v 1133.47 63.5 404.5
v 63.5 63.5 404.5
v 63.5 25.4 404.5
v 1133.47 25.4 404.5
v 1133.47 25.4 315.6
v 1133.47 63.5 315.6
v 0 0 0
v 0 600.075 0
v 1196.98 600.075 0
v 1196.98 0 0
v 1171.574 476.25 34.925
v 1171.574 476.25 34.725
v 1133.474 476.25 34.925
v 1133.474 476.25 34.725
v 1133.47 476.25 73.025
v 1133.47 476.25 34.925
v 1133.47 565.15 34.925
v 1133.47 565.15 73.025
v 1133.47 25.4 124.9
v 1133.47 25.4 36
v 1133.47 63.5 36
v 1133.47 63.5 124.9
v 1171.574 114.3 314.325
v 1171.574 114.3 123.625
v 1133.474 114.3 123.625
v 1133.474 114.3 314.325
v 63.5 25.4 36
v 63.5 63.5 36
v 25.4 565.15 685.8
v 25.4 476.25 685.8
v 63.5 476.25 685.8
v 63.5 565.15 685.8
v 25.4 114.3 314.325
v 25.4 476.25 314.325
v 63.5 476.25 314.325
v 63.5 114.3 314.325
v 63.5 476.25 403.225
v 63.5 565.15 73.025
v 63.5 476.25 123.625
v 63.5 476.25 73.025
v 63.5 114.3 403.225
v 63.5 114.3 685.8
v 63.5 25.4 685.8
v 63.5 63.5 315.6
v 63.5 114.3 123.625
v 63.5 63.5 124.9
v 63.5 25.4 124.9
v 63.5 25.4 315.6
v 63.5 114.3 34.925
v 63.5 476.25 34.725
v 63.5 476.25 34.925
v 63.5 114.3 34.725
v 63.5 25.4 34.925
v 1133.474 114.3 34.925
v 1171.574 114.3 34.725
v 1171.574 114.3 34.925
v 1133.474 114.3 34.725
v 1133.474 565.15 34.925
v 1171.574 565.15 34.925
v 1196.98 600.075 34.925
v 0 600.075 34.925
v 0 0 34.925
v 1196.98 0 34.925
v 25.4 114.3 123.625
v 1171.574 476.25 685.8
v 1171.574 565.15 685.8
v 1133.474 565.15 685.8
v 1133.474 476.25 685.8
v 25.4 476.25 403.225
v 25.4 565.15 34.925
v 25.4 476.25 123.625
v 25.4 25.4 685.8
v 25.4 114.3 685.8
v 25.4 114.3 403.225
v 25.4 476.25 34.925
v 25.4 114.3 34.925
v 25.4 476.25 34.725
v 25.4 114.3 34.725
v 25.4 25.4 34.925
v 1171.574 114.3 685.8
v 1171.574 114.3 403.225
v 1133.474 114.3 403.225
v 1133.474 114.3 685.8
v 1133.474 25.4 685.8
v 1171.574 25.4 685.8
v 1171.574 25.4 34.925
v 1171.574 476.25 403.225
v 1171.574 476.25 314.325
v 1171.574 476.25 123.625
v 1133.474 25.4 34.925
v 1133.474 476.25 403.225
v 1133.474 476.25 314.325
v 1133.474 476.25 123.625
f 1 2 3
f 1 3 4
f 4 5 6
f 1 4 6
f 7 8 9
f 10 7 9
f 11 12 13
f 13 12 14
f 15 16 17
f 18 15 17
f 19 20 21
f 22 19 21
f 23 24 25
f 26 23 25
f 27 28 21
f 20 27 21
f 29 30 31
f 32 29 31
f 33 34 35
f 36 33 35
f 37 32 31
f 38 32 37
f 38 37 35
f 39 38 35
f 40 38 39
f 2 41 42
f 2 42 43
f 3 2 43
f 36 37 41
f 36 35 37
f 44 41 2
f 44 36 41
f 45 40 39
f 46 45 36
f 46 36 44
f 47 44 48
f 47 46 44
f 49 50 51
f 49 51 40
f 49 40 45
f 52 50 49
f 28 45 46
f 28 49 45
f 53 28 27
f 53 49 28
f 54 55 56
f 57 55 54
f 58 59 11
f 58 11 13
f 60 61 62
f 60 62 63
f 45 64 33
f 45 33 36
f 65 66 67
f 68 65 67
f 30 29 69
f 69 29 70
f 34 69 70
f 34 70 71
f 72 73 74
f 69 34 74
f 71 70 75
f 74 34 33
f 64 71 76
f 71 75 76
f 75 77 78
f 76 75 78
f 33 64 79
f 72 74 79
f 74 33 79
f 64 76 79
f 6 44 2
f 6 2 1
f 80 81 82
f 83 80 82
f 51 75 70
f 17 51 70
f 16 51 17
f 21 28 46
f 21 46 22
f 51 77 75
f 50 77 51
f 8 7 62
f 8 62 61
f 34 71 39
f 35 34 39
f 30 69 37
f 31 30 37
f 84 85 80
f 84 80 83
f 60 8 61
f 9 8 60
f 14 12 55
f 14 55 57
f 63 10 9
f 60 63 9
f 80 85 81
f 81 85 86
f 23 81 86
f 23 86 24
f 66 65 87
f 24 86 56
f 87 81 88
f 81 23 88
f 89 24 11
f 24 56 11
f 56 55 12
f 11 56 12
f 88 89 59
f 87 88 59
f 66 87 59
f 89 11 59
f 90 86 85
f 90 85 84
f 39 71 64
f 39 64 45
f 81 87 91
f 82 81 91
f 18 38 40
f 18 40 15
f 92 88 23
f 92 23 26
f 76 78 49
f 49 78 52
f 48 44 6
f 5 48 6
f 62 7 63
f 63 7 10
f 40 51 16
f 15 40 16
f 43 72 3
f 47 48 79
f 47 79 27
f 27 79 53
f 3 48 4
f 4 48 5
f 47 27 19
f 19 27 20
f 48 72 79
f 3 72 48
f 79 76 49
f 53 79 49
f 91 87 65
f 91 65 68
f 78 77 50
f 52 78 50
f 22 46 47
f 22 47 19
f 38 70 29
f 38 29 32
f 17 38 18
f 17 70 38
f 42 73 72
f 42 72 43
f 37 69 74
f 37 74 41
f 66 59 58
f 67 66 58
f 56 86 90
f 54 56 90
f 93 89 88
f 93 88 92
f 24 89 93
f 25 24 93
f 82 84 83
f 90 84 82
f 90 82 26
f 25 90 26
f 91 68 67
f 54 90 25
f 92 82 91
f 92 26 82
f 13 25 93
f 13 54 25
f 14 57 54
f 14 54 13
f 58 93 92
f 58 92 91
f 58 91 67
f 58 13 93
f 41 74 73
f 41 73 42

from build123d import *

# Parameters (mm, degrees)
BOX_W        = 1196.98
BOX_H        = 600.075
BOX_DEPTH    = 34.925
BOX001_W     = 38.1
BOX001_H     = 88.9
BOX001_DEPTH = 650.875
BOX002_W     = 1069.97
BOX002_H     = 38.1
BOX002_DEPTH = 88.9
BOX003_W     = 38.1
BOX003_H     = 361.95
BOX003_DEPTH = 88.9
BOX004_W     = 1069.97
BOX004_H     = 38.1
BOX004_DEPTH = 88.9
BOX005_W     = 38.1
BOX005_H     = 361.95
BOX005_DEPTH = 88.9
BOX006_W     = 1069.97
BOX006_H     = 88.9
BOX006_DEPTH = 38.1


with BuildPart() as tabletop:
    # Box → Box (new body)
    with BuildSketch(Plane.XY):
        with Locations((598.49, 300.0375)):
            Rectangle(BOX_W, BOX_H)
    extrude(amount=BOX_DEPTH)


with BuildPart() as leg_br:
    # Box001 → Box001 (new body)
    with BuildSketch(Plane(origin=(25.4, 25.4, 34.925), x_dir=(1, 0, 0), z_dir=(0, 0, 1))):
        with Locations((19.05, 44.45)):
            Rectangle(BOX001_W, BOX001_H)
    extrude(amount=BOX001_DEPTH)


with BuildPart() as part_mirroring001:
    # Part__Mirroring001: instance of leg_br
    add(leg_br.part.mirror(Plane(origin=(598.487, 0, 0), x_dir=(0, -1, 0), z_dir=(1, 0, 0))))


with BuildPart() as back_support:
    # Box002 → Box002 (new body)
    with BuildSketch(Plane(origin=(63.5, 25.4, 214), x_dir=(1, 0, 0), z_dir=(0, 0, 1))):
        with Locations((534.985, 19.05)):
            Rectangle(BOX002_W, BOX002_H)
    extrude(amount=BOX002_DEPTH)


with BuildPart() as side_support:
    # Box003 → Box003 (new body)
    with BuildSketch(Plane(origin=(25.4, 114.3, 212.725), x_dir=(1, 0, 0), z_dir=(0, 0, 1))):
        with Locations((19.05, 180.975)):
            Rectangle(BOX003_W, BOX003_H)
    extrude(amount=BOX003_DEPTH)


with BuildPart() as braces_lower:
    # Part__Mirroring003: instance of side_support
    add(side_support.part.mirror(Plane(origin=(598.487, 0, 0), x_dir=(0, -1, 0), z_dir=(1, 0, 0))))

    # Compound: union back_support, side_support
    add(back_support.part)
    add(side_support.part)


with BuildPart() as braces_lower_1:
    # Compound placement: moved
    add(braces_lower.part.moved(Location((0, 0, 101.6))))


with BuildPart() as back_support001:
    # Box004 → Box004 (new body)
    with BuildSketch(Plane(origin=(63.5, 25.4, 214), x_dir=(1, 0, 0), z_dir=(0, 0, 1))):
        with Locations((534.985, 19.05)):
            Rectangle(BOX004_W, BOX004_H)
    extrude(amount=BOX004_DEPTH)


with BuildPart() as side_support001:
    # Box005 → Box005 (new body)
    with BuildSketch(Plane(origin=(25.4, 114.3, 212.725), x_dir=(1, 0, 0), z_dir=(0, 0, 1))):
        with Locations((19.05, 180.975)):
            Rectangle(BOX005_W, BOX005_H)
    extrude(amount=BOX005_DEPTH)


with BuildPart() as braces_upper:
    # Part__Mirroring004: instance of side_support001
    add(side_support001.part.mirror(Plane(origin=(598.487, 0, 0), x_dir=(0, -1, 0), z_dir=(1, 0, 0))))

    # Compound001: union back_support001, side_support001
    add(back_support001.part)
    add(side_support001.part)


with BuildPart() as braces_upper_1:
    # Compound001 placement: moved
    add(braces_upper.part.moved(Location((0, 0, -178))))


with BuildPart() as brace_front:
    # Box006 → Box006 (new body)
    with BuildSketch(Plane(origin=(63.5, 476.25, 34.925), x_dir=(1, 0, 0), z_dir=(0, 0, 1))):
        with Locations((534.985, 44.45)):
            Rectangle(BOX006_W, BOX006_H)
    extrude(amount=BOX006_DEPTH)


with BuildPart() as part_mirroring:
    # Part__Mirroring: instance of leg_br
    add(leg_br.part.mirror(Plane(origin=(0, 295.275, 0), x_dir=(1, 0, 0), z_dir=(0, 1, 0))))


with BuildPart() as frame:
    # Part__Mirroring002: instance of Part__Mirroring
    add(part_mirroring.part.mirror(Plane(origin=(598.487, 0, 0), x_dir=(0, -1, 0), z_dir=(1, 0, 0))))

    # Connect: union Part__Mirroring001, Braces_lower, Braces_upper, Brace_front, leg_br, Part__Mirroring
    add(part_mirroring001.part)
    add(braces_lower_1.part)
    add(braces_upper_1.part)
    add(brace_front.part)
    add(leg_br.part)
    add(part_mirroring.part)


solid = Compound([tabletop.part, frame.part])
